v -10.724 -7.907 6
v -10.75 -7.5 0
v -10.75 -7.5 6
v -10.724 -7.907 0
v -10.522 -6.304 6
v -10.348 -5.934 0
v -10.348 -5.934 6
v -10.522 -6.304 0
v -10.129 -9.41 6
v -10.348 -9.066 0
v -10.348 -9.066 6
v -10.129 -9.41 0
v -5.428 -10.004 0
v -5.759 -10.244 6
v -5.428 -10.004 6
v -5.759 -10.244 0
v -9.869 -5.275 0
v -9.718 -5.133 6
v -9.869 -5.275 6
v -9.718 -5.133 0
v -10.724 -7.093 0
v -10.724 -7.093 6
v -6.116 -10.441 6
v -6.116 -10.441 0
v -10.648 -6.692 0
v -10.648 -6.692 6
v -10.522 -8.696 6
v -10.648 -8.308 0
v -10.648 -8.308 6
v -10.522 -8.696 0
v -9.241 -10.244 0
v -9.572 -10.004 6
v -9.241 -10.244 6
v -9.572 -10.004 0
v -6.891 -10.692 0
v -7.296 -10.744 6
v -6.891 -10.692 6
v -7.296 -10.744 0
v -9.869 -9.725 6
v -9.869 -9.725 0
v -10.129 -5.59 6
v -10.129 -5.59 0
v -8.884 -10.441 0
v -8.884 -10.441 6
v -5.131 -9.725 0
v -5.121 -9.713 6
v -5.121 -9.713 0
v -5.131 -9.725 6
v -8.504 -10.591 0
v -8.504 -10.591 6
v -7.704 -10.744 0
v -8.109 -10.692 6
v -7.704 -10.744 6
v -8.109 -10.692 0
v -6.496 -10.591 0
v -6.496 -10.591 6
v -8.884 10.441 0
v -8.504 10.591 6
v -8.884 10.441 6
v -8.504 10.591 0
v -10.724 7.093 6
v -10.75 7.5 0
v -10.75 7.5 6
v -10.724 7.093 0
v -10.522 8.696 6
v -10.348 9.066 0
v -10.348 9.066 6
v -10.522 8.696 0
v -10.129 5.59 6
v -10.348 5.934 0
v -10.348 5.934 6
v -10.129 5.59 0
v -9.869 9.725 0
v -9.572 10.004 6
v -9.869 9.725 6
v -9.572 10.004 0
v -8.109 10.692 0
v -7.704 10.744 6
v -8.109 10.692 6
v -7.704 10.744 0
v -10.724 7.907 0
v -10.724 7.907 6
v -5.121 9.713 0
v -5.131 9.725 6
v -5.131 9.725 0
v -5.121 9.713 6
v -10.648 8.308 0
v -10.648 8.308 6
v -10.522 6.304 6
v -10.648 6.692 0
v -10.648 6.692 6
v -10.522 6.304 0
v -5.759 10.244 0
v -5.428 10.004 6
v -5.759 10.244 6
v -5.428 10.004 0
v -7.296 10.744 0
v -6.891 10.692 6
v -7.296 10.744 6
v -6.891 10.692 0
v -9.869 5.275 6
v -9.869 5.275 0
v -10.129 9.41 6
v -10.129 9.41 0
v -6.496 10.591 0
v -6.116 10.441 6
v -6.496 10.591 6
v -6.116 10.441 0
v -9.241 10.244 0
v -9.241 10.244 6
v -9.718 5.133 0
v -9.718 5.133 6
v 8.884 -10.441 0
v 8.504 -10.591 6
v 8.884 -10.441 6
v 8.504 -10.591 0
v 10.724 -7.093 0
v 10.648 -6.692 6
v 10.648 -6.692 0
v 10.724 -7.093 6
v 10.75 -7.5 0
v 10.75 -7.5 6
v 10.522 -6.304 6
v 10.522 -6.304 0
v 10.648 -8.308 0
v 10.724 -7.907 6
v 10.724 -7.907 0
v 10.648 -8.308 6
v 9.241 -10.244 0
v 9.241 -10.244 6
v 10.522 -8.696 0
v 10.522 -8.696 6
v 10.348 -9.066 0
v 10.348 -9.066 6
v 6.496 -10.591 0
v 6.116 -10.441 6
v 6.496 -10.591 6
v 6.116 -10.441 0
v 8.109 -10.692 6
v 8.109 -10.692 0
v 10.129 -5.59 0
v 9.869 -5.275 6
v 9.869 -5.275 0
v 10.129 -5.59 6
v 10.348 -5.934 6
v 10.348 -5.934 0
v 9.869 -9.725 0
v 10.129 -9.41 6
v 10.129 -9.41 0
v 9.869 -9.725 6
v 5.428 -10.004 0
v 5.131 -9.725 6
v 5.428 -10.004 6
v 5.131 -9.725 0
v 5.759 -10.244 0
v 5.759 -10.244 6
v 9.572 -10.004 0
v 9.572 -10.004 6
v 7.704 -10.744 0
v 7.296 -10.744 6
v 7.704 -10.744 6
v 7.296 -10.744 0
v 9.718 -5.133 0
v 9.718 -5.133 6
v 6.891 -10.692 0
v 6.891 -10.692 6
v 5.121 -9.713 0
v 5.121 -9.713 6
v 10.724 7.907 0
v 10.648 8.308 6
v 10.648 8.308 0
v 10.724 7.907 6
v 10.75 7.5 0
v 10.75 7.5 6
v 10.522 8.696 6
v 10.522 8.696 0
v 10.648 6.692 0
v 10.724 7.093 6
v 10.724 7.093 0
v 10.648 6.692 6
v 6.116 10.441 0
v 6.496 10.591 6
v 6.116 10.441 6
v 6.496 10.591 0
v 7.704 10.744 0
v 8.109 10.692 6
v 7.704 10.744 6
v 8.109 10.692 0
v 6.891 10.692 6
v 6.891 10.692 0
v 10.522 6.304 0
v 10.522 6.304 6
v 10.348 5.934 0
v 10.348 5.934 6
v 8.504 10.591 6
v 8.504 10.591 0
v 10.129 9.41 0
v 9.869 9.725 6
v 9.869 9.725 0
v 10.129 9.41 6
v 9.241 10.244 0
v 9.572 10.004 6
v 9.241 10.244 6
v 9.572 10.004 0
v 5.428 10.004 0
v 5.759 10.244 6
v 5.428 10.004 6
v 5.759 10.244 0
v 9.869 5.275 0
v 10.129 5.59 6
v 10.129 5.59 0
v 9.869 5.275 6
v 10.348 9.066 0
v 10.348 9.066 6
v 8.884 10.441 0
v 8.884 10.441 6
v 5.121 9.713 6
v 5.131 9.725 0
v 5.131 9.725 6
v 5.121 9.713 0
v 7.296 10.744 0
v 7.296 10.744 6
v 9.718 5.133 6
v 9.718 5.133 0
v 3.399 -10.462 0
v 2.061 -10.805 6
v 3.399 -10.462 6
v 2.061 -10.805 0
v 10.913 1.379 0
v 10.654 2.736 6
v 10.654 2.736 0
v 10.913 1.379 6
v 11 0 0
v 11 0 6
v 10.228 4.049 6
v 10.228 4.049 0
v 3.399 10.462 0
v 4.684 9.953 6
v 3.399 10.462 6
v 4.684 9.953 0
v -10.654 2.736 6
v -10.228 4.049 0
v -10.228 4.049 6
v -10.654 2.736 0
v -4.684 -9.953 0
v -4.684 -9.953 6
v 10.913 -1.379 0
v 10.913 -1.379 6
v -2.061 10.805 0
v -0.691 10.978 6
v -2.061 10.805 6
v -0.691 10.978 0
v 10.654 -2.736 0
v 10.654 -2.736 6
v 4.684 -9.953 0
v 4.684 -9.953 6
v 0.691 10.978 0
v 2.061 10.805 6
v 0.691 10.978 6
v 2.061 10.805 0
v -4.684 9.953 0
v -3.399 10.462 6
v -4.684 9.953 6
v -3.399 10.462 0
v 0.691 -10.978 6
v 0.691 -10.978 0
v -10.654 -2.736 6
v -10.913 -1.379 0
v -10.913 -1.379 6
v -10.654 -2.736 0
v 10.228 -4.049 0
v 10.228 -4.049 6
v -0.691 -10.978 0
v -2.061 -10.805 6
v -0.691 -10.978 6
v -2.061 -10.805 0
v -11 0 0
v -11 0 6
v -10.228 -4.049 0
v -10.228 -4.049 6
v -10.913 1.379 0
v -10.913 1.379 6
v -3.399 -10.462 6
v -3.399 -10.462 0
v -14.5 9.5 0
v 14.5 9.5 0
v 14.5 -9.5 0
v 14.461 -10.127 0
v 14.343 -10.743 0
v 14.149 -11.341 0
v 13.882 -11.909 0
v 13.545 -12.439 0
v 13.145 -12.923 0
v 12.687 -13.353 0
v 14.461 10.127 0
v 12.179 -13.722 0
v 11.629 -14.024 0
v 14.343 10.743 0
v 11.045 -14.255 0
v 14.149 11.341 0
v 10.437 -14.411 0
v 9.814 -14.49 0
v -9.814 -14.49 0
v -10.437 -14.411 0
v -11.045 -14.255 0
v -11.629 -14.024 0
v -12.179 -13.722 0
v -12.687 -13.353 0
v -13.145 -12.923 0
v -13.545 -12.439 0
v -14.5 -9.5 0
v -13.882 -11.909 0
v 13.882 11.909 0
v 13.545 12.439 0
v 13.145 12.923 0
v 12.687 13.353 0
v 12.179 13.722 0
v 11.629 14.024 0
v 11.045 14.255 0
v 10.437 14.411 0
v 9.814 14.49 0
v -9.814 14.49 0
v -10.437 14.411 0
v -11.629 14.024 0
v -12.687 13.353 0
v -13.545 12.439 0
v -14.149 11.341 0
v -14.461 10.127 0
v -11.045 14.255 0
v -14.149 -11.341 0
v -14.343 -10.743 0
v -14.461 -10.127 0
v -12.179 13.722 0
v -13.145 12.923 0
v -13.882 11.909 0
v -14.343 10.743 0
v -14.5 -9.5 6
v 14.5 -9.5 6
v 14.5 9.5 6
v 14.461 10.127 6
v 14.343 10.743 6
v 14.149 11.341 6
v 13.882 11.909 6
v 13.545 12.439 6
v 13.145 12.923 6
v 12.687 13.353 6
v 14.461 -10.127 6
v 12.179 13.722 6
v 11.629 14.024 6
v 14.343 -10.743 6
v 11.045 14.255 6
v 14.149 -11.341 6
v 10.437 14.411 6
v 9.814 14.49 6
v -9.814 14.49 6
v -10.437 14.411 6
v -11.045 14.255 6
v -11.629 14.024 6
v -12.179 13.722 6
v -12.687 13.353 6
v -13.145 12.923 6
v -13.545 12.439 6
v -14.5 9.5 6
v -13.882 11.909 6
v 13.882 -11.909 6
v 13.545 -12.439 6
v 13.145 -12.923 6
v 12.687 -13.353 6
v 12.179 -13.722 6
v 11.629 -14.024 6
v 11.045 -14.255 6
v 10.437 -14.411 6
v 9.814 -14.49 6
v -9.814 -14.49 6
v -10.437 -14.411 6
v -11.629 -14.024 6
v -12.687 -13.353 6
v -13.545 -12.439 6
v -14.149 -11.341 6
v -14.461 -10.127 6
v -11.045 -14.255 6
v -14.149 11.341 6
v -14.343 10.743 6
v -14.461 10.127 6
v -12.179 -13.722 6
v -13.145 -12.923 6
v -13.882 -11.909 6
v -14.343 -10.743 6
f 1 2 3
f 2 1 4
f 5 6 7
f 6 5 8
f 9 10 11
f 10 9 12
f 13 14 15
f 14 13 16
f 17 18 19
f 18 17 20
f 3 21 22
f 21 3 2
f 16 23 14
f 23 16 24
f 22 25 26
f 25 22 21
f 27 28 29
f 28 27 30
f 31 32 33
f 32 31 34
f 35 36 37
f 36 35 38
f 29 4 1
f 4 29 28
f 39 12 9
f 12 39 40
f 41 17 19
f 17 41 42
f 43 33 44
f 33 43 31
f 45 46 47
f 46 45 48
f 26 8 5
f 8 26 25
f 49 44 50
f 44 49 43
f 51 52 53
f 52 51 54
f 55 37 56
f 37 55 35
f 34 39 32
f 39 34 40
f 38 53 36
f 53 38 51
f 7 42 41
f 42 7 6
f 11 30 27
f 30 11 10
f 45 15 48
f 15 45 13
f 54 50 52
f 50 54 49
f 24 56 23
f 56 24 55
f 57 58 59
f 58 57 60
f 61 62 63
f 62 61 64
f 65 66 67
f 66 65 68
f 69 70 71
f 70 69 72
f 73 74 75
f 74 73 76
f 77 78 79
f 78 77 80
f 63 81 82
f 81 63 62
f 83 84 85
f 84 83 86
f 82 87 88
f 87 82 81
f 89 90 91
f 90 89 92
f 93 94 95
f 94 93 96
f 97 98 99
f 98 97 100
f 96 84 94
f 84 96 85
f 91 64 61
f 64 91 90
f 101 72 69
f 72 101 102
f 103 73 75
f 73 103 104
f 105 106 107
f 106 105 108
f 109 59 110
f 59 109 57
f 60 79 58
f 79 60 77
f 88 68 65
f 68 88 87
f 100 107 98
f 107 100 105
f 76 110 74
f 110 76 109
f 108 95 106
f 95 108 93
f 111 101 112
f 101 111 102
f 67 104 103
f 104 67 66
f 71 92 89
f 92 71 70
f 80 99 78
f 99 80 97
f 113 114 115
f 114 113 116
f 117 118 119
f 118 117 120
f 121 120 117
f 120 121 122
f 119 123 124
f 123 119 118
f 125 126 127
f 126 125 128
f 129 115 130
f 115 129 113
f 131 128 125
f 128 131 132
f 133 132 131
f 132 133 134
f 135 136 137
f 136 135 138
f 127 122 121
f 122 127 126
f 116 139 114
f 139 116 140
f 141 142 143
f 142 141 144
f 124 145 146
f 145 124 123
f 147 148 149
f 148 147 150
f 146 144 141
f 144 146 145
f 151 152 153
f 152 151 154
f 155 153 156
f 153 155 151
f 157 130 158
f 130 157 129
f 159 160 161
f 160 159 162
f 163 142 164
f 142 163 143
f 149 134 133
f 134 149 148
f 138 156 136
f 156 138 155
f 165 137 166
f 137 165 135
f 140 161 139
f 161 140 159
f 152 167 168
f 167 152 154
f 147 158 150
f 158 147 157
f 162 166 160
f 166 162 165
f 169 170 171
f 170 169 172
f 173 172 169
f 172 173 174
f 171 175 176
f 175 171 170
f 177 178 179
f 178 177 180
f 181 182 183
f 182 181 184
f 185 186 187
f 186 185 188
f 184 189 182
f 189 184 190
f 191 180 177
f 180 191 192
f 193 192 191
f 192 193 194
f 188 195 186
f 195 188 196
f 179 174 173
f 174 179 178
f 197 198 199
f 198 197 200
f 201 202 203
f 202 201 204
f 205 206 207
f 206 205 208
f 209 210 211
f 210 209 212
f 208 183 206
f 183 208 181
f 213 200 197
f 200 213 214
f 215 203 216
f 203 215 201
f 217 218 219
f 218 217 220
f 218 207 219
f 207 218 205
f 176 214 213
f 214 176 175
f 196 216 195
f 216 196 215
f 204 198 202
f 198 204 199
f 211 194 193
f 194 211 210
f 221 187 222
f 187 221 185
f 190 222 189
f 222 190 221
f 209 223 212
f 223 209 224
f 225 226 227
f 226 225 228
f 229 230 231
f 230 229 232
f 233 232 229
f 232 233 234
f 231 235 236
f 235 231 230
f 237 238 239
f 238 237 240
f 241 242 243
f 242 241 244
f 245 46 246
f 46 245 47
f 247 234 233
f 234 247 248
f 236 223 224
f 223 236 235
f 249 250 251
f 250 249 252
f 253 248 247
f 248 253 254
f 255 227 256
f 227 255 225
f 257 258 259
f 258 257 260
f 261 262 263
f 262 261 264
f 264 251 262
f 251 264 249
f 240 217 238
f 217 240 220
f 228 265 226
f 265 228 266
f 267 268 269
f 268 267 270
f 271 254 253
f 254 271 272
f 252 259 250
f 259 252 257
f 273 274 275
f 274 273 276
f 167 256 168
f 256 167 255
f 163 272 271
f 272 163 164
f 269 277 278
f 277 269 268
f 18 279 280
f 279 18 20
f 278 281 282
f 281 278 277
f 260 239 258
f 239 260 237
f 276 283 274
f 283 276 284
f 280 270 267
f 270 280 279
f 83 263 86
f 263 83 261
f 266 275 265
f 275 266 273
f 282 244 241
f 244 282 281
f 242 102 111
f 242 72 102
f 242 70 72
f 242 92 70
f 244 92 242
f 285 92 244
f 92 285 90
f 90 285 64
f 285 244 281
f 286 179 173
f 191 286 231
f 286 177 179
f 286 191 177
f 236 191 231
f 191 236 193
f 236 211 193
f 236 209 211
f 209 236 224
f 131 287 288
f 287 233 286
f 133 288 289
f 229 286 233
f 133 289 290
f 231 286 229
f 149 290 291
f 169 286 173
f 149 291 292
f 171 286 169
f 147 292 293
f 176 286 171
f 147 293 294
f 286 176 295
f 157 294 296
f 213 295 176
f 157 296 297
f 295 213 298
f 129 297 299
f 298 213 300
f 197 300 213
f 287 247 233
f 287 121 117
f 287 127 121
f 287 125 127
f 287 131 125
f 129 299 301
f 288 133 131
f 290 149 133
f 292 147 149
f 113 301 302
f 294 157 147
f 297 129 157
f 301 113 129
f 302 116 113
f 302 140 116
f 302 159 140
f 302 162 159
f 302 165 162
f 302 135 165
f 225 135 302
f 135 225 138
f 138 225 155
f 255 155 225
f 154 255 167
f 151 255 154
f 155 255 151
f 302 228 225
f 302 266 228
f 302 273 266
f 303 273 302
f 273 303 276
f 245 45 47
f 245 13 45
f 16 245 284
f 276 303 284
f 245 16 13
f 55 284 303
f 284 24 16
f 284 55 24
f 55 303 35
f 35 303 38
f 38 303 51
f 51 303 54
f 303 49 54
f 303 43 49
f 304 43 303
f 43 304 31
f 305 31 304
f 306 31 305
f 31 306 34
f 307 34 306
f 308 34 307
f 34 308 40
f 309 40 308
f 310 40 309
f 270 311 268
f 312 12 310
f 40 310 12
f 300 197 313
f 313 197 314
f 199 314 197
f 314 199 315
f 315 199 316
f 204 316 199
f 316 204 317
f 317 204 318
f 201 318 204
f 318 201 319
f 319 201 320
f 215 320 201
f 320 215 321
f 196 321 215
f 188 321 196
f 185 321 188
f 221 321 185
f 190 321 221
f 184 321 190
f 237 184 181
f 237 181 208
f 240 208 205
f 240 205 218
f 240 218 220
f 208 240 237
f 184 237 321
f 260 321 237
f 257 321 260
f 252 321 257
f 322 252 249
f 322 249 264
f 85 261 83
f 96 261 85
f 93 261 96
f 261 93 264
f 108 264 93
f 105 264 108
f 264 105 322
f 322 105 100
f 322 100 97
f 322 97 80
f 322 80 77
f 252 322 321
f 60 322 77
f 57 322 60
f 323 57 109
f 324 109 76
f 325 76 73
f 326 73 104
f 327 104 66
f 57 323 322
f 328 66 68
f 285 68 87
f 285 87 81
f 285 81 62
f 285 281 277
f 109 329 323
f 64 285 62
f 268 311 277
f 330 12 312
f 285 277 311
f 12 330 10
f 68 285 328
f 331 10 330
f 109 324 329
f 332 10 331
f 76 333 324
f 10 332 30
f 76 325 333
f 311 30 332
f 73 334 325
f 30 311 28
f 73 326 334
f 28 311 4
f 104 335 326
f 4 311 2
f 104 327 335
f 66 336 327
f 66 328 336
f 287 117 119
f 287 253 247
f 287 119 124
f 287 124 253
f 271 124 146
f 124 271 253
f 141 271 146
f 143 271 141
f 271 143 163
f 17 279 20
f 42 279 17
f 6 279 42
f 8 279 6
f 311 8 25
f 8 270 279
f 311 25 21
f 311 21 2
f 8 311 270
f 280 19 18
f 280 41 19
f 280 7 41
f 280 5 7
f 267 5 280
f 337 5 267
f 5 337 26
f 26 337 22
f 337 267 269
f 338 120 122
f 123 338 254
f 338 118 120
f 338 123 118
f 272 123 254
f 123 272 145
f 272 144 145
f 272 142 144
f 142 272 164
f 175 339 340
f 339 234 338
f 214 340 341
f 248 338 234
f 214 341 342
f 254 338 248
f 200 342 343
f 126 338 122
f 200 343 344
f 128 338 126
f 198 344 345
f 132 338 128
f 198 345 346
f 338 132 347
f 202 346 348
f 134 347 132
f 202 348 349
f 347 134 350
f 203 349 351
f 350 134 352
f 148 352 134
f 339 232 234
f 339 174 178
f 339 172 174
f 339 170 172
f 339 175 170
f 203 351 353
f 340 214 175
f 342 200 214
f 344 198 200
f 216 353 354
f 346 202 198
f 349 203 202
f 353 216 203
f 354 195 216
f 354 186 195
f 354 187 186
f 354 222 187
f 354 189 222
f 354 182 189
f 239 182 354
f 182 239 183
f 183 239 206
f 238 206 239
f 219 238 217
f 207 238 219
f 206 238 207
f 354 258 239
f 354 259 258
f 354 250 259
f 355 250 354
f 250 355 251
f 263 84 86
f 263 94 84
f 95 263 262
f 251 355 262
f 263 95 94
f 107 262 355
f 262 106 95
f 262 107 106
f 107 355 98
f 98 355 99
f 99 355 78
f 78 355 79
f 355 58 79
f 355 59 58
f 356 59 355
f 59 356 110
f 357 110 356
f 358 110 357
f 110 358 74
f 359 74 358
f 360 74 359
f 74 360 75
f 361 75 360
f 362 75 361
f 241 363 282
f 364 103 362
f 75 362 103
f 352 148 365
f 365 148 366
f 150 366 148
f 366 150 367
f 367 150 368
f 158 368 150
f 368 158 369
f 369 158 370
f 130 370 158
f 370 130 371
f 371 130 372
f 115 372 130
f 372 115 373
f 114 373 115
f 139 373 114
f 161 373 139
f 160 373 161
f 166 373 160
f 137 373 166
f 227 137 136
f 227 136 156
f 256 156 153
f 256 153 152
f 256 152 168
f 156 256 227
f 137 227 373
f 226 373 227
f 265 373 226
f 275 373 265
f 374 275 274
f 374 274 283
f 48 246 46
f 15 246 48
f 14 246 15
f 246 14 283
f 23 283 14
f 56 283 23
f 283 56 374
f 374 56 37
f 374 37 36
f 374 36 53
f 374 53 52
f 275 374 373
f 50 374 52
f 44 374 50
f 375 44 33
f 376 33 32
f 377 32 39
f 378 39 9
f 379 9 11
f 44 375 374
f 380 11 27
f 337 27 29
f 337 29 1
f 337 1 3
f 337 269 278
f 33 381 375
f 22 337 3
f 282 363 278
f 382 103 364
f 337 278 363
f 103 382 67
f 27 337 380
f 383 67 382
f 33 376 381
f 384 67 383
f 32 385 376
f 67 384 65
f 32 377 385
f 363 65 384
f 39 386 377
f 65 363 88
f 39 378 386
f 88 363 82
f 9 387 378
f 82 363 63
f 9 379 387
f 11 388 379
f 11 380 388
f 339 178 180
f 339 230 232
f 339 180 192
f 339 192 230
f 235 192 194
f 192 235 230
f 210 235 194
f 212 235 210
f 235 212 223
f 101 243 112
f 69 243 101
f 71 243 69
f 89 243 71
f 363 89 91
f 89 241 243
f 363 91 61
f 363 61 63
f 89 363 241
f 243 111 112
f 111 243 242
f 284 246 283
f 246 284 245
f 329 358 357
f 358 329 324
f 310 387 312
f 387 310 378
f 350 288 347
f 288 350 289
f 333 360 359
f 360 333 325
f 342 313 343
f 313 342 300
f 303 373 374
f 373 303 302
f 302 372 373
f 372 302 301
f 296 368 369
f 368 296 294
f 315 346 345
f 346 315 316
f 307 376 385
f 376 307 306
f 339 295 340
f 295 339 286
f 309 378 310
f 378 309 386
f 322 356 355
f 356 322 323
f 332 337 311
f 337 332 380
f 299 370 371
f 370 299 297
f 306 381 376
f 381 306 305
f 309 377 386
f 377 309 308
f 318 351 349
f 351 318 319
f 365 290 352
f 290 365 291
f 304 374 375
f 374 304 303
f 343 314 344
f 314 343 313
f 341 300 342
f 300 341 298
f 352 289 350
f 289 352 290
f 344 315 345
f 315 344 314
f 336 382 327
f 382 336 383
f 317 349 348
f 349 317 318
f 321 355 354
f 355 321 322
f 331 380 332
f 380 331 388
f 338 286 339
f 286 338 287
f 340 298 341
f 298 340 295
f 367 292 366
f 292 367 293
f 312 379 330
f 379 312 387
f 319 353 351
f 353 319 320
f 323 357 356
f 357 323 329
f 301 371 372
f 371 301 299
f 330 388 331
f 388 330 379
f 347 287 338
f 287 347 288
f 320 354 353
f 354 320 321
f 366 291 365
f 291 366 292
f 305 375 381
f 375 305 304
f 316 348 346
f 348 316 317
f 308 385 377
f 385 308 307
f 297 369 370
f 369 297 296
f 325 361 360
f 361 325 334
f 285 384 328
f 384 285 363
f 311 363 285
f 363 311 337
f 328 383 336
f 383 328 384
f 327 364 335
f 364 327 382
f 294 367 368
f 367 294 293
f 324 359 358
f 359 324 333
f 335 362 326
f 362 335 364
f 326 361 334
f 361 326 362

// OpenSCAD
$fn = 50;

difference() {
	union() {
		hull() {
			translate(v = [-9.5, 9.5, 0]) {
				cylinder(h = 6, r = 5);
			}
			translate(v = [9.5, 9.5, 0]) {
				cylinder(h = 6, r = 5);
			}
			translate(v = [-9.5, -9.5, 0]) {
				cylinder(h = 6, r = 5);
			}
			translate(v = [9.5, -9.5, 0]) {
				cylinder(h = 6, r = 5);
			}
		}
	}
	union() {
		translate(v = [-7.5, -7.5, -100.0]) {
			cylinder(h = 200, r = 3.25);
		}
		translate(v = [-7.5, 7.5, -100.0]) {
			cylinder(h = 200, r = 3.25);
		}
		translate(v = [7.5, -7.5, -100.0]) {
			cylinder(h = 200, r = 3.25);
		}
		translate(v = [7.5, 7.5, -100.0]) {
			cylinder(h = 200, r = 3.25);
		}
		translate(v = [-7.5, -7.5, -100.0]) {
			cylinder(h = 200, r = 1.8);
		}
		translate(v = [-7.5, 7.5, -100.0]) {
			cylinder(h = 200, r = 1.8);
		}
		translate(v = [7.5, -7.5, -100.0]) {
			cylinder(h = 200, r = 1.8);
		}
		translate(v = [7.5, 7.5, -100.0]) {
			cylinder(h = 200, r = 1.8);
		}
		cylinder(h = 6, r = 11.0);
	}
}
